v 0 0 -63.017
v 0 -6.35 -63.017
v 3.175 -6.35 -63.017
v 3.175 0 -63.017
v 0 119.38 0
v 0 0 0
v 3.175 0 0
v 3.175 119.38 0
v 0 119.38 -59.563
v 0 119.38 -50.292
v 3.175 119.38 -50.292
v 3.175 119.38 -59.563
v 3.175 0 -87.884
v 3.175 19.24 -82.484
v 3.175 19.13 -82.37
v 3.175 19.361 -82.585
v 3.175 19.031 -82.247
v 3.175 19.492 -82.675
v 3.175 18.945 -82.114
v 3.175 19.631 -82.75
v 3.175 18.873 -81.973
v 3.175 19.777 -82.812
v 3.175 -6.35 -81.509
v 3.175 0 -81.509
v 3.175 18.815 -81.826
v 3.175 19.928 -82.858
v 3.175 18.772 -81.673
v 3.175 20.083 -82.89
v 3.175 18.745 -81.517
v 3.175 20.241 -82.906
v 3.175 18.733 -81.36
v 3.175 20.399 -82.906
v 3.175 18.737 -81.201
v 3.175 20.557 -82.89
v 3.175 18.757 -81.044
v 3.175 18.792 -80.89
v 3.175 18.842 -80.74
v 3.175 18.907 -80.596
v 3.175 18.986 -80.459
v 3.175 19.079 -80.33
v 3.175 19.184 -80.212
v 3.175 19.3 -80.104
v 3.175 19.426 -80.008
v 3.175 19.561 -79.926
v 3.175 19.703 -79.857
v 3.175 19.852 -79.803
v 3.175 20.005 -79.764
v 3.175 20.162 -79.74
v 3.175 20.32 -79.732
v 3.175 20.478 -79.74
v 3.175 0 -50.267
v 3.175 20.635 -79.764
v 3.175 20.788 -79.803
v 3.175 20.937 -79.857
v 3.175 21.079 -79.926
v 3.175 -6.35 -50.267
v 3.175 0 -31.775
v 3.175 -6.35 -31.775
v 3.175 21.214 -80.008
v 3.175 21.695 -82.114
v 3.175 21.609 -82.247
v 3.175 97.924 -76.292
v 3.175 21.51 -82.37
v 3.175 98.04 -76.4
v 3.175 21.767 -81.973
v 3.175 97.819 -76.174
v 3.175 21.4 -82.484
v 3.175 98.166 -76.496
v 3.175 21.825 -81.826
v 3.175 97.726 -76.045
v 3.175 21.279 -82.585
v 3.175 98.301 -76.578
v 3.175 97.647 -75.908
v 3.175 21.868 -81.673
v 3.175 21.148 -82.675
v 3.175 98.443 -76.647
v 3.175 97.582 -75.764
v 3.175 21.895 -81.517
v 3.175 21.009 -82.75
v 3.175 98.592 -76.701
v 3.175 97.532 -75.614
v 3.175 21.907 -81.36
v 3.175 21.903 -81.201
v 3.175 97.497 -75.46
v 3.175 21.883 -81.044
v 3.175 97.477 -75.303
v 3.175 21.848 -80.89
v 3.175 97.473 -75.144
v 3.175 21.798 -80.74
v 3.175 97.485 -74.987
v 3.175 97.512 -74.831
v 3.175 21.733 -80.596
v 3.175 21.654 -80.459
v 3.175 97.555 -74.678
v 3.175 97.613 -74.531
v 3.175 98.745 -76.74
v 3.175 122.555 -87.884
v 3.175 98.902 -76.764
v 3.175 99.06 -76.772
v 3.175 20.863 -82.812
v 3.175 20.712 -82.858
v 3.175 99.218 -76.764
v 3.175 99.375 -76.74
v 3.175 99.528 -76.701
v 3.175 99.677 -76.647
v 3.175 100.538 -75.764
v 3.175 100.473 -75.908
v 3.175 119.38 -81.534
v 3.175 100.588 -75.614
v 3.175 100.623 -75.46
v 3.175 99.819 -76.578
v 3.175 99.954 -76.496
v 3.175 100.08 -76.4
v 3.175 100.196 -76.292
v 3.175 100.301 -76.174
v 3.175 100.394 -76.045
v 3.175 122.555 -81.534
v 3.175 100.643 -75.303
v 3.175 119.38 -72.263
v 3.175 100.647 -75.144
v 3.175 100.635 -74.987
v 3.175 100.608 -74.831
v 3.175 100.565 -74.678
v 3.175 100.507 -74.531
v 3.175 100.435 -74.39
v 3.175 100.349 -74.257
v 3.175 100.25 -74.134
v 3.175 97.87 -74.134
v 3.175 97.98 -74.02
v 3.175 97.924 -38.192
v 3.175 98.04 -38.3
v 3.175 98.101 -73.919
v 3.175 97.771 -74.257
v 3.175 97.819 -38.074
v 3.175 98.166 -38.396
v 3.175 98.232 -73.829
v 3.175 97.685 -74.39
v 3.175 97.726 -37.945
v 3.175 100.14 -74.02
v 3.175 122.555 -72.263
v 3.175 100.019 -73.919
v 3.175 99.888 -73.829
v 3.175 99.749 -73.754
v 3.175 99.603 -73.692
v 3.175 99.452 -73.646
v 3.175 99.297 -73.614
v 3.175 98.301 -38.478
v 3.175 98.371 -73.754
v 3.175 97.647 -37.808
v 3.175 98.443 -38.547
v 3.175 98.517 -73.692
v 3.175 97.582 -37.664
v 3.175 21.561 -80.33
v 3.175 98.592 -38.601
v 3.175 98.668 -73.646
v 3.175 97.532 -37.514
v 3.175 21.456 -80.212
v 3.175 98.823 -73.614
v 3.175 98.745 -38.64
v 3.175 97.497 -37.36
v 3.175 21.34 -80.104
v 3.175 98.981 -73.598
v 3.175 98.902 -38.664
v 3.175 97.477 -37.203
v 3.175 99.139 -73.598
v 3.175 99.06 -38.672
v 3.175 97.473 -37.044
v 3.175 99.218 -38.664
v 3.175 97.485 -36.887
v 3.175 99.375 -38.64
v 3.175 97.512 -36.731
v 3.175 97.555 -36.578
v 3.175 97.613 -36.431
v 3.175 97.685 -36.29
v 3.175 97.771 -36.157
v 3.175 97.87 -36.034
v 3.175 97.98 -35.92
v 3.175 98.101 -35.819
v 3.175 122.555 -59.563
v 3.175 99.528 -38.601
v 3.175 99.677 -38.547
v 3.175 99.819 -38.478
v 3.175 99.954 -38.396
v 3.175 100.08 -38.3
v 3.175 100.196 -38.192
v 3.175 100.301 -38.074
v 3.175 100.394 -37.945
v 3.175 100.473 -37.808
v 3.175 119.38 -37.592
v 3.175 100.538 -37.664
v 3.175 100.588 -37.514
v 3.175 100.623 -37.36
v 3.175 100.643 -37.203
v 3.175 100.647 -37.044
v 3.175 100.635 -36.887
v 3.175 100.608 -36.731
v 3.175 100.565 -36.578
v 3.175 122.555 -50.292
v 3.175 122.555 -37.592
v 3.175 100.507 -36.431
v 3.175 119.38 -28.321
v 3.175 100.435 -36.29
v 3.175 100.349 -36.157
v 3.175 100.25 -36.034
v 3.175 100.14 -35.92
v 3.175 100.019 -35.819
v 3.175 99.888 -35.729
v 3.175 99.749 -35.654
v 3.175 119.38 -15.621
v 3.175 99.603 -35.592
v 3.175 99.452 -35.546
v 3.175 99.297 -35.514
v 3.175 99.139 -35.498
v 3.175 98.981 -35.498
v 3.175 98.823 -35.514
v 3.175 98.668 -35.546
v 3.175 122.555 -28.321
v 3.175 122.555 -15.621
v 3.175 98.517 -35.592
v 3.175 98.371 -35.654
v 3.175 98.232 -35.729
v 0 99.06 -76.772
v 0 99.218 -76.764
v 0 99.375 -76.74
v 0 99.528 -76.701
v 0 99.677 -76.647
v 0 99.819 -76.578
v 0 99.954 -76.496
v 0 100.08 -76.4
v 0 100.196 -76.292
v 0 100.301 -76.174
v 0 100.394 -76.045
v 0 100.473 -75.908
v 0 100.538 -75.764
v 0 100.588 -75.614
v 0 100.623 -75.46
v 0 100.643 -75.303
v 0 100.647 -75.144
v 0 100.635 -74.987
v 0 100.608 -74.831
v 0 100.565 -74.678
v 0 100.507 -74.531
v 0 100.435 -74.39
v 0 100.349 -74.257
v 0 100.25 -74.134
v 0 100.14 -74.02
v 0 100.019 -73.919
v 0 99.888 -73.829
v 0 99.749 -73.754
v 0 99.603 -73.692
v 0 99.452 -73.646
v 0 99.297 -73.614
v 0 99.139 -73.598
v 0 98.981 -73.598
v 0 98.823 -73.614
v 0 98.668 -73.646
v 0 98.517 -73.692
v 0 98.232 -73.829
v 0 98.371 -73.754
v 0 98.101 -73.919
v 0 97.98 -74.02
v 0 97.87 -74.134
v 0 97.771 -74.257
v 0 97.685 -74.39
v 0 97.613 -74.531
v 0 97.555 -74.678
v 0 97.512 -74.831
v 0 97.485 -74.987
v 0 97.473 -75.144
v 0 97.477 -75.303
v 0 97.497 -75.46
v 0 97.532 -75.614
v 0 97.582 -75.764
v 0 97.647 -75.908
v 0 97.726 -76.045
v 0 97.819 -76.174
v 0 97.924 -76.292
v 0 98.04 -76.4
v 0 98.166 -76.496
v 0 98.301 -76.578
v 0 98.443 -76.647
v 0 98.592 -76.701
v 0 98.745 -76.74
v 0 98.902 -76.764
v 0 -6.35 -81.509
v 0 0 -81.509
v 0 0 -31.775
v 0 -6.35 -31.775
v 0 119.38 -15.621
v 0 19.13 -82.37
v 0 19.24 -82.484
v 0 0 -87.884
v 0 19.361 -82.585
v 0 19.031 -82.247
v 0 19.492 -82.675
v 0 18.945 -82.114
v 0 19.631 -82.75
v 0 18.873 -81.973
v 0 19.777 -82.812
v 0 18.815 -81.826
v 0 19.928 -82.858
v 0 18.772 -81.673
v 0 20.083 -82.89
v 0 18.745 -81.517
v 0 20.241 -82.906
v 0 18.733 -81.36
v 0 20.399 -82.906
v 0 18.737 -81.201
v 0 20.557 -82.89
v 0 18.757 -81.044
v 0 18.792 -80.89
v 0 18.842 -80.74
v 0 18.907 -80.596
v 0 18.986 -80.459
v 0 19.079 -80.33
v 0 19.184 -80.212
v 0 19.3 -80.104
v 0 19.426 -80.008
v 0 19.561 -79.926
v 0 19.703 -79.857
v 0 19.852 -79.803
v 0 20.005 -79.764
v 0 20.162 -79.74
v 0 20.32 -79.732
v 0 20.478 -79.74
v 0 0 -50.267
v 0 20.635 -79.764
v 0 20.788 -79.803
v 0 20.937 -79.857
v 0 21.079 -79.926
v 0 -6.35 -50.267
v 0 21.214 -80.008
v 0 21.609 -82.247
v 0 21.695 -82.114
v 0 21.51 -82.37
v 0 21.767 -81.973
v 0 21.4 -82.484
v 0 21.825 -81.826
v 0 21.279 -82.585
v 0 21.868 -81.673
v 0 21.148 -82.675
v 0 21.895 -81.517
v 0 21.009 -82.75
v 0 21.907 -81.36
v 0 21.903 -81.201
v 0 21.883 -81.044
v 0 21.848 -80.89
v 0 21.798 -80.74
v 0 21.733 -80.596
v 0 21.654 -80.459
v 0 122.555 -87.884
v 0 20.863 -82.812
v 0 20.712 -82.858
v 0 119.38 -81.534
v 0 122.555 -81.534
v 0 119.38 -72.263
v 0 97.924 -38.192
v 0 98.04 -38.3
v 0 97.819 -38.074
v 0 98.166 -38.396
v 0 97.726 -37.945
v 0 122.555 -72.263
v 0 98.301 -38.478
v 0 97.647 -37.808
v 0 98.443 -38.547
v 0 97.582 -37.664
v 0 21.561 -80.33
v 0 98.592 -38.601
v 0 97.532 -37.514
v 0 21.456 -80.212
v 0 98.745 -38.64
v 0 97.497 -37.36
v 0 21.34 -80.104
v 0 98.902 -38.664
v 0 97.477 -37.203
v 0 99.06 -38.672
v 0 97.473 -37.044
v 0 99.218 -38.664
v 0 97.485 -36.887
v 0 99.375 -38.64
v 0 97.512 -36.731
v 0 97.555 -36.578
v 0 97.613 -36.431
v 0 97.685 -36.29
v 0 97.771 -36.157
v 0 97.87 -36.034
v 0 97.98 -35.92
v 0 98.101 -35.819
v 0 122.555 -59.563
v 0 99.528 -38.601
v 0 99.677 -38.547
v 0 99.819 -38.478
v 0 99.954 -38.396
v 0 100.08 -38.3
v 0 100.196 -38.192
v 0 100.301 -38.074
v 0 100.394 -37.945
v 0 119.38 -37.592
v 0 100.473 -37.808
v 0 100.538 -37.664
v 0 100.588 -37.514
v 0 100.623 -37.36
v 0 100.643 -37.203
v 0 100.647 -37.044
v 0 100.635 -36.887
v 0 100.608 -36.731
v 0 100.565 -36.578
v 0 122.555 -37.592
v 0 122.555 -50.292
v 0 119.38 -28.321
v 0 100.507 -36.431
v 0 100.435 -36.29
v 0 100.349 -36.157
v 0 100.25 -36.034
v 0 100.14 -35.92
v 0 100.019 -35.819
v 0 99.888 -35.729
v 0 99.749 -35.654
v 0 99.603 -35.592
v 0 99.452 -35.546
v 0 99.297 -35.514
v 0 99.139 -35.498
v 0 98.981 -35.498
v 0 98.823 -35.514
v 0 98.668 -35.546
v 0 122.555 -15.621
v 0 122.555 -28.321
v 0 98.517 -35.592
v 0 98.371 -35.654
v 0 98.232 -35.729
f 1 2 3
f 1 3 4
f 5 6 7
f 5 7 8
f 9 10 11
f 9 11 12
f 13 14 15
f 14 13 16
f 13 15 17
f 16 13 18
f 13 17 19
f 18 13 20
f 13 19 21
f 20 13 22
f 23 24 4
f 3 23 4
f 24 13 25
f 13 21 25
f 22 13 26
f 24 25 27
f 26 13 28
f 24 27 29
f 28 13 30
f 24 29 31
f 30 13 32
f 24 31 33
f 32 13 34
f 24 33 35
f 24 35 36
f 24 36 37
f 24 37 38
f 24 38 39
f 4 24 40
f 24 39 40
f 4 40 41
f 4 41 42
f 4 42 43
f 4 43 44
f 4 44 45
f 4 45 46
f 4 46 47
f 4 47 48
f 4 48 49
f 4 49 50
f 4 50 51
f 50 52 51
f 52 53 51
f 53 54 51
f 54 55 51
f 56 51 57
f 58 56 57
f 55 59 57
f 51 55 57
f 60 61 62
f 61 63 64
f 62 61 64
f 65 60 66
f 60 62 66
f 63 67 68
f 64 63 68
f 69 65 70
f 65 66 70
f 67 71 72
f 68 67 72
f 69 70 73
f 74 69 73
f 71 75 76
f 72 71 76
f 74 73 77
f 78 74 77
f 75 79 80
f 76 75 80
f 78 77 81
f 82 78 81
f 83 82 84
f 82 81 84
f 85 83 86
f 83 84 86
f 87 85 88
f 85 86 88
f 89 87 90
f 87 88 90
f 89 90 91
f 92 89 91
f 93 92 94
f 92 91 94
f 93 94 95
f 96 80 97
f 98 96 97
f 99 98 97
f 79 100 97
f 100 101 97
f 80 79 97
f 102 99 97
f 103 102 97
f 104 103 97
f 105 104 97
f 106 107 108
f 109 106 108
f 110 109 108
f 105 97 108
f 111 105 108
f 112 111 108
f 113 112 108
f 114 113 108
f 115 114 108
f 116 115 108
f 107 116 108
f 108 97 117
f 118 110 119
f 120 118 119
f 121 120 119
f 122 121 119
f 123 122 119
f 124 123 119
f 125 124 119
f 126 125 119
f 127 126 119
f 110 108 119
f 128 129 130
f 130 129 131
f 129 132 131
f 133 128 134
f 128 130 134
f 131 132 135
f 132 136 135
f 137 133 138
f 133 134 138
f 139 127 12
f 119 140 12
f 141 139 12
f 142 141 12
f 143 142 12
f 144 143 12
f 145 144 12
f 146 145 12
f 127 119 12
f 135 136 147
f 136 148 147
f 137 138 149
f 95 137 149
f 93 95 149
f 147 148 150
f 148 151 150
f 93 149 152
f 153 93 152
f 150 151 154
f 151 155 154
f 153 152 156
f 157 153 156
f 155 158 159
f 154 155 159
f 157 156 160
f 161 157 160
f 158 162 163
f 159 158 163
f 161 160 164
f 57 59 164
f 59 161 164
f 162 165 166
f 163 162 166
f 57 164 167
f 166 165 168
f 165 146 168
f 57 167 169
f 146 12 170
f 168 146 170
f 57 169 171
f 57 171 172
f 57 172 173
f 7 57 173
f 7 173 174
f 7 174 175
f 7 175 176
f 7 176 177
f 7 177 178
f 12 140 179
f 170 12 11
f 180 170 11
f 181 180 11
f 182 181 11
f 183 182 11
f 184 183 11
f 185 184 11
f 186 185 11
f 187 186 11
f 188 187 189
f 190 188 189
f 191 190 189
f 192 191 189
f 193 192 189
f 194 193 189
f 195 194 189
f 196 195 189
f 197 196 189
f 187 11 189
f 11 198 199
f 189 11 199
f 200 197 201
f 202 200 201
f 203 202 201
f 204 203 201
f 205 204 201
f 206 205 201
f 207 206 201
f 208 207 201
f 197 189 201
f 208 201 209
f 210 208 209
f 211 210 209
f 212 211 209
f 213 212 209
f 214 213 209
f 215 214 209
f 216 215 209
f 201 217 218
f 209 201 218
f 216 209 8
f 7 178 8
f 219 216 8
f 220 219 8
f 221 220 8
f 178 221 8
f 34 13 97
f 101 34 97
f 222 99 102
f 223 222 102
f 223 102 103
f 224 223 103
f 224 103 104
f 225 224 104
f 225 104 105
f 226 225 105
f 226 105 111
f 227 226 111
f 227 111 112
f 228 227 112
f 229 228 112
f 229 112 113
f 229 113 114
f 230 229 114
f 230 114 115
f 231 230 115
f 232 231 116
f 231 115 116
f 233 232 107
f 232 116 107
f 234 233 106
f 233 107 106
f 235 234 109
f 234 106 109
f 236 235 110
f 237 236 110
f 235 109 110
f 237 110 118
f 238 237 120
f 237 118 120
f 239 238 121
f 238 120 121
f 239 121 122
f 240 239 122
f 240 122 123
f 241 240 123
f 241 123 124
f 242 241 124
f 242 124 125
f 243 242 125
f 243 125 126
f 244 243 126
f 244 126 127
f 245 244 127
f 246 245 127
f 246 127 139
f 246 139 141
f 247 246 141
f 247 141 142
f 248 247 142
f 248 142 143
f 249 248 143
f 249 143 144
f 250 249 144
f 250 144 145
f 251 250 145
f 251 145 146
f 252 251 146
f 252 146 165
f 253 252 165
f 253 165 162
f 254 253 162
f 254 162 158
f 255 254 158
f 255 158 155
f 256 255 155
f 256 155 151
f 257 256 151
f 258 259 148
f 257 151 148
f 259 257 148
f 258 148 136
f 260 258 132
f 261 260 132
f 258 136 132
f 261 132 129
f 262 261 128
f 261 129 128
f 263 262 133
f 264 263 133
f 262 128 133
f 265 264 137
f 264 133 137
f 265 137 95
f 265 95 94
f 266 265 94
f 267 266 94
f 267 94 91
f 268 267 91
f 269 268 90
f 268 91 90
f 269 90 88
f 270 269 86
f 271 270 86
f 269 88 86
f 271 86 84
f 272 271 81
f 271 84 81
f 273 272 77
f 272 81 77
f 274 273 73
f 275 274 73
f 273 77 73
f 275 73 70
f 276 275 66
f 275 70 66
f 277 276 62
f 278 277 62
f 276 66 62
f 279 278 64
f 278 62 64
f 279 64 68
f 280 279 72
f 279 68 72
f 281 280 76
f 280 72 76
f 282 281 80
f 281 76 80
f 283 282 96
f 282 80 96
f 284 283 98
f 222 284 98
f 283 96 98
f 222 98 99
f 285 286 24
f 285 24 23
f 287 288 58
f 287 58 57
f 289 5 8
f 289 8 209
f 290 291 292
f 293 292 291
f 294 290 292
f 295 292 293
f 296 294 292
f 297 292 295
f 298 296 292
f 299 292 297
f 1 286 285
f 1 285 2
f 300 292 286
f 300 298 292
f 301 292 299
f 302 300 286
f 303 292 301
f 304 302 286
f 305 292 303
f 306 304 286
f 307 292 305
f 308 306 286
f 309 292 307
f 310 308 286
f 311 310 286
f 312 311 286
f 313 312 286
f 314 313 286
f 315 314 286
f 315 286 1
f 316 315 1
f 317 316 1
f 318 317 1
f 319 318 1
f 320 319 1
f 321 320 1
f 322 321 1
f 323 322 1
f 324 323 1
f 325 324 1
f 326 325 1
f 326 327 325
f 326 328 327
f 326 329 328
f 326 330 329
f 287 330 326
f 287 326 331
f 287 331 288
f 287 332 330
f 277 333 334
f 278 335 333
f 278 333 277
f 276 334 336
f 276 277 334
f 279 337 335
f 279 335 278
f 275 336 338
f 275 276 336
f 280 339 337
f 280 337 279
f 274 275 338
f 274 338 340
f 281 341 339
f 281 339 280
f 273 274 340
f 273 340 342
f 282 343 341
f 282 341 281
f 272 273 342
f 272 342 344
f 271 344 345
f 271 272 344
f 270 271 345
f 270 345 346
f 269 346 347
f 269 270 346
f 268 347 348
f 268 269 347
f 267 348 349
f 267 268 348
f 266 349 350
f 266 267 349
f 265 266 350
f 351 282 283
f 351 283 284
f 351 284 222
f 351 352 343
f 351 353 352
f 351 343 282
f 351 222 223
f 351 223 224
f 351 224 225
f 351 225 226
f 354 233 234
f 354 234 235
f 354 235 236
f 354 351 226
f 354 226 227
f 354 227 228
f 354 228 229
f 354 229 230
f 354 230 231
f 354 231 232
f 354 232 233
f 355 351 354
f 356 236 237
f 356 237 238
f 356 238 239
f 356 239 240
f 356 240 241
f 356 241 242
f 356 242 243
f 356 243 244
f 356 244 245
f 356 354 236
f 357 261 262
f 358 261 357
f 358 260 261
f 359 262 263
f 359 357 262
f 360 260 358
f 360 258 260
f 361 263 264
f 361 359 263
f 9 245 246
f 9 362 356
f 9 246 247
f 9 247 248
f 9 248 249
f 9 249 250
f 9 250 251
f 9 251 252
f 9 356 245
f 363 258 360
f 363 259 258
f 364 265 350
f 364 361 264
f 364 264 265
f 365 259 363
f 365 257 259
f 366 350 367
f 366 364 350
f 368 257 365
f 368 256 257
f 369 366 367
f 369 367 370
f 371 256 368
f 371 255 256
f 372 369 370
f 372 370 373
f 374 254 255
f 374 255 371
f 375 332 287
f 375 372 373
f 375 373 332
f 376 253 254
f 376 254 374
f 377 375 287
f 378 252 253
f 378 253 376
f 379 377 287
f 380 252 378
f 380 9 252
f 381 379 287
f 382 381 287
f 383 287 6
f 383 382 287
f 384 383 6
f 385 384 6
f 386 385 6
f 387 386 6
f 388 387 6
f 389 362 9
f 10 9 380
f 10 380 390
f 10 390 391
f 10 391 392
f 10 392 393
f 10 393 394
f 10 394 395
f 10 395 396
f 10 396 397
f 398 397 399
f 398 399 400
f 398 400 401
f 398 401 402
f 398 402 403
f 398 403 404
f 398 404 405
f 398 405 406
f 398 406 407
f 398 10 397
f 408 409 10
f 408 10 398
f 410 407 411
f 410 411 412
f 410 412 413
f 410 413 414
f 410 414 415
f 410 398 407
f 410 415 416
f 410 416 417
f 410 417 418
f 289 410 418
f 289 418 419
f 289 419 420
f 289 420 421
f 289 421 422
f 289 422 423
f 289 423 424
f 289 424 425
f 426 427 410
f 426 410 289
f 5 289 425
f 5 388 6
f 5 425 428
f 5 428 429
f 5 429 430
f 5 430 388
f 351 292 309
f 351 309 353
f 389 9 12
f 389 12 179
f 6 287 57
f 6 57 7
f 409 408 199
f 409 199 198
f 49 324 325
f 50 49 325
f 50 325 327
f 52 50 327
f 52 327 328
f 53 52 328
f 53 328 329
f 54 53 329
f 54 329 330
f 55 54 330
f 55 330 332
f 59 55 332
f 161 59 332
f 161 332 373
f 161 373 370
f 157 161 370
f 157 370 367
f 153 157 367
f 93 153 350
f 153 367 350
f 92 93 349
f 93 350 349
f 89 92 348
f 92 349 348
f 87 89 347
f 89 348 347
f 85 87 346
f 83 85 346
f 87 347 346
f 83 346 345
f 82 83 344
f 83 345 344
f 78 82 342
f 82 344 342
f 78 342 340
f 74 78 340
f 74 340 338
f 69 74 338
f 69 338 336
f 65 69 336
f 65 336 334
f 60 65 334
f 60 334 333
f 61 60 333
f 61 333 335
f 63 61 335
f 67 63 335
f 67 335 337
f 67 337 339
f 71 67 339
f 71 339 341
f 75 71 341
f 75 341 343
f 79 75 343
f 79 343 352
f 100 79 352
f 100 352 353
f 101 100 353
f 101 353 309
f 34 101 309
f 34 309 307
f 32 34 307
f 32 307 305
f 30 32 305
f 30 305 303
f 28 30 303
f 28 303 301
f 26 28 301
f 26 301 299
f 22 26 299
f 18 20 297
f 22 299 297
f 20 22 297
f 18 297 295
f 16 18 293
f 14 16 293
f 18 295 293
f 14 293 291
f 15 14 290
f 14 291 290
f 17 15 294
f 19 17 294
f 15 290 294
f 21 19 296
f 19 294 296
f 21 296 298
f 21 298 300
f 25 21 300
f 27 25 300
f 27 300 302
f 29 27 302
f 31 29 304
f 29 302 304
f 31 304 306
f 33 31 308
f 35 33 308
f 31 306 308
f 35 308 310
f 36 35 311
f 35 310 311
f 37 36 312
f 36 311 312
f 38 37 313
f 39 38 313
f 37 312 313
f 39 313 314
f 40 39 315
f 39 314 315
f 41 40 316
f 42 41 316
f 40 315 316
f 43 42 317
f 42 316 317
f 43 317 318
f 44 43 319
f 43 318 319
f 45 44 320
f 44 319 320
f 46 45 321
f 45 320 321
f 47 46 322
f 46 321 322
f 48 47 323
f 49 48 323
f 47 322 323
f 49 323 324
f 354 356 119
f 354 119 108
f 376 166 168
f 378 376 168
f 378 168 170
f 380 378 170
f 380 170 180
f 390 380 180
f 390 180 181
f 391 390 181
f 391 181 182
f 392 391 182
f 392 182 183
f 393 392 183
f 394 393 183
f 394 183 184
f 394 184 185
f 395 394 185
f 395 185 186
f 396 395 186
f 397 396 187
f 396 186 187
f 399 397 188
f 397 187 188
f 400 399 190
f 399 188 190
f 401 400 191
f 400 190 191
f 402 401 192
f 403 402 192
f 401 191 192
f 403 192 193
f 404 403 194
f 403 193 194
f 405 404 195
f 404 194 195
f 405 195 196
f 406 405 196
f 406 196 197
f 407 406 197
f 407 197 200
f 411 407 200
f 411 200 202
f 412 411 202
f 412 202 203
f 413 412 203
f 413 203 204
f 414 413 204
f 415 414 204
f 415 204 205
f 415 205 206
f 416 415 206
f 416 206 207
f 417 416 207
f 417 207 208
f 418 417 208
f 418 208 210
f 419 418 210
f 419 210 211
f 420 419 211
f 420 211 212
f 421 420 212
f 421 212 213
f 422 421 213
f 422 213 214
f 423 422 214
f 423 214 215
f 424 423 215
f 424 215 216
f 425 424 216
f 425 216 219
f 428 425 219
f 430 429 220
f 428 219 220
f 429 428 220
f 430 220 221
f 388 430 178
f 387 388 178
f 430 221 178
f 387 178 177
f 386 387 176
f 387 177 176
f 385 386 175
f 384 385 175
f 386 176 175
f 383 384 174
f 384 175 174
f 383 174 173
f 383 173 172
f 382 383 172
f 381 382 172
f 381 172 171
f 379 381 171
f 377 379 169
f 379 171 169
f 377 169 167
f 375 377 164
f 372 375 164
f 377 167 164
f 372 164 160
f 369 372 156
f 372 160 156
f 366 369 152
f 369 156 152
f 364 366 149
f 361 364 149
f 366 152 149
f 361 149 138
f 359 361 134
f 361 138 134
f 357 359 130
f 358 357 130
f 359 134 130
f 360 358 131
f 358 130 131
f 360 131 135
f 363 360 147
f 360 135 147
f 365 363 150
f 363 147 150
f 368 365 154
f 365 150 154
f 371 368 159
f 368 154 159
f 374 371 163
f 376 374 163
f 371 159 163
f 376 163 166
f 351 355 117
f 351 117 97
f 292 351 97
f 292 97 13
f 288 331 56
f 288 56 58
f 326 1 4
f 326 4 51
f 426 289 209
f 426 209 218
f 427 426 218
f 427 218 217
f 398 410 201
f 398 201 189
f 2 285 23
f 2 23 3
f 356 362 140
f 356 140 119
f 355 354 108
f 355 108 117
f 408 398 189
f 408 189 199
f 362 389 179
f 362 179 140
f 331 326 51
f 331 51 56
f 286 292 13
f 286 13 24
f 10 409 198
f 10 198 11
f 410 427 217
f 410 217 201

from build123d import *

# Parameters (mm, degrees)
BOSS_EXTRUDE1_DEPTH = 3.175
SKETCH2_R           = 1.5875
CUT_EXTRUDE1_DEPTH  = 4.175
SKETCH3_R           = 1.5875
CUT_EXTRUDE2_DEPTH  = 4.175


with BuildPart() as part:
    # Sketch1 → Boss-Extrude1 (new body)
    with BuildSketch(Plane(origin=(0, 0, 0), x_dir=(0, 0, -1), z_dir=(1, 0, 0))):
        Polygon((0, 119.38), (15.621, 119.38), (15.621, 122.555), (28.321, 122.555), (28.321, 119.38), (37.592, 119.38), (37.592, 122.555), (50.292, 122.555), (50.292, 119.38), (59.563, 119.38), (59.563, 122.555), (72.263, 122.555), (72.263, 119.38), (81.534, 119.38), (81.534, 122.555), (87.884, 122.555), (87.884, 0), (81.5086, 0), (81.5086, -6.35), (63.0174, -6.35), (63.0174, 0), (50.2666, 0), (50.2666, -6.35), (31.7754, -6.35), (31.7754, 0), (0, 0), align=None)
    extrude(amount=BOSS_EXTRUDE1_DEPTH)

    # Sketch2 → Cut-Extrude1 (cut, through all)
    with BuildSketch(Plane(origin=(3.175, 0, 0), x_dir=(0, 0, -1), z_dir=(1, 0, 0))):
        with Locations((37.084, 99.06)):
            Circle(SKETCH2_R)
        with Locations((75.184, 99.06)):
            Circle(SKETCH2_R)
    extrude(amount=-CUT_EXTRUDE1_DEPTH, mode=Mode.SUBTRACT)

    # Sketch3 → Cut-Extrude2 (cut, through all)
    with BuildSketch(Plane.ZY):
        with Locations((-81.319973634, 20.32)):
            Circle(SKETCH3_R)
    extrude(amount=-CUT_EXTRUDE2_DEPTH, mode=Mode.SUBTRACT)


solid = part.part
